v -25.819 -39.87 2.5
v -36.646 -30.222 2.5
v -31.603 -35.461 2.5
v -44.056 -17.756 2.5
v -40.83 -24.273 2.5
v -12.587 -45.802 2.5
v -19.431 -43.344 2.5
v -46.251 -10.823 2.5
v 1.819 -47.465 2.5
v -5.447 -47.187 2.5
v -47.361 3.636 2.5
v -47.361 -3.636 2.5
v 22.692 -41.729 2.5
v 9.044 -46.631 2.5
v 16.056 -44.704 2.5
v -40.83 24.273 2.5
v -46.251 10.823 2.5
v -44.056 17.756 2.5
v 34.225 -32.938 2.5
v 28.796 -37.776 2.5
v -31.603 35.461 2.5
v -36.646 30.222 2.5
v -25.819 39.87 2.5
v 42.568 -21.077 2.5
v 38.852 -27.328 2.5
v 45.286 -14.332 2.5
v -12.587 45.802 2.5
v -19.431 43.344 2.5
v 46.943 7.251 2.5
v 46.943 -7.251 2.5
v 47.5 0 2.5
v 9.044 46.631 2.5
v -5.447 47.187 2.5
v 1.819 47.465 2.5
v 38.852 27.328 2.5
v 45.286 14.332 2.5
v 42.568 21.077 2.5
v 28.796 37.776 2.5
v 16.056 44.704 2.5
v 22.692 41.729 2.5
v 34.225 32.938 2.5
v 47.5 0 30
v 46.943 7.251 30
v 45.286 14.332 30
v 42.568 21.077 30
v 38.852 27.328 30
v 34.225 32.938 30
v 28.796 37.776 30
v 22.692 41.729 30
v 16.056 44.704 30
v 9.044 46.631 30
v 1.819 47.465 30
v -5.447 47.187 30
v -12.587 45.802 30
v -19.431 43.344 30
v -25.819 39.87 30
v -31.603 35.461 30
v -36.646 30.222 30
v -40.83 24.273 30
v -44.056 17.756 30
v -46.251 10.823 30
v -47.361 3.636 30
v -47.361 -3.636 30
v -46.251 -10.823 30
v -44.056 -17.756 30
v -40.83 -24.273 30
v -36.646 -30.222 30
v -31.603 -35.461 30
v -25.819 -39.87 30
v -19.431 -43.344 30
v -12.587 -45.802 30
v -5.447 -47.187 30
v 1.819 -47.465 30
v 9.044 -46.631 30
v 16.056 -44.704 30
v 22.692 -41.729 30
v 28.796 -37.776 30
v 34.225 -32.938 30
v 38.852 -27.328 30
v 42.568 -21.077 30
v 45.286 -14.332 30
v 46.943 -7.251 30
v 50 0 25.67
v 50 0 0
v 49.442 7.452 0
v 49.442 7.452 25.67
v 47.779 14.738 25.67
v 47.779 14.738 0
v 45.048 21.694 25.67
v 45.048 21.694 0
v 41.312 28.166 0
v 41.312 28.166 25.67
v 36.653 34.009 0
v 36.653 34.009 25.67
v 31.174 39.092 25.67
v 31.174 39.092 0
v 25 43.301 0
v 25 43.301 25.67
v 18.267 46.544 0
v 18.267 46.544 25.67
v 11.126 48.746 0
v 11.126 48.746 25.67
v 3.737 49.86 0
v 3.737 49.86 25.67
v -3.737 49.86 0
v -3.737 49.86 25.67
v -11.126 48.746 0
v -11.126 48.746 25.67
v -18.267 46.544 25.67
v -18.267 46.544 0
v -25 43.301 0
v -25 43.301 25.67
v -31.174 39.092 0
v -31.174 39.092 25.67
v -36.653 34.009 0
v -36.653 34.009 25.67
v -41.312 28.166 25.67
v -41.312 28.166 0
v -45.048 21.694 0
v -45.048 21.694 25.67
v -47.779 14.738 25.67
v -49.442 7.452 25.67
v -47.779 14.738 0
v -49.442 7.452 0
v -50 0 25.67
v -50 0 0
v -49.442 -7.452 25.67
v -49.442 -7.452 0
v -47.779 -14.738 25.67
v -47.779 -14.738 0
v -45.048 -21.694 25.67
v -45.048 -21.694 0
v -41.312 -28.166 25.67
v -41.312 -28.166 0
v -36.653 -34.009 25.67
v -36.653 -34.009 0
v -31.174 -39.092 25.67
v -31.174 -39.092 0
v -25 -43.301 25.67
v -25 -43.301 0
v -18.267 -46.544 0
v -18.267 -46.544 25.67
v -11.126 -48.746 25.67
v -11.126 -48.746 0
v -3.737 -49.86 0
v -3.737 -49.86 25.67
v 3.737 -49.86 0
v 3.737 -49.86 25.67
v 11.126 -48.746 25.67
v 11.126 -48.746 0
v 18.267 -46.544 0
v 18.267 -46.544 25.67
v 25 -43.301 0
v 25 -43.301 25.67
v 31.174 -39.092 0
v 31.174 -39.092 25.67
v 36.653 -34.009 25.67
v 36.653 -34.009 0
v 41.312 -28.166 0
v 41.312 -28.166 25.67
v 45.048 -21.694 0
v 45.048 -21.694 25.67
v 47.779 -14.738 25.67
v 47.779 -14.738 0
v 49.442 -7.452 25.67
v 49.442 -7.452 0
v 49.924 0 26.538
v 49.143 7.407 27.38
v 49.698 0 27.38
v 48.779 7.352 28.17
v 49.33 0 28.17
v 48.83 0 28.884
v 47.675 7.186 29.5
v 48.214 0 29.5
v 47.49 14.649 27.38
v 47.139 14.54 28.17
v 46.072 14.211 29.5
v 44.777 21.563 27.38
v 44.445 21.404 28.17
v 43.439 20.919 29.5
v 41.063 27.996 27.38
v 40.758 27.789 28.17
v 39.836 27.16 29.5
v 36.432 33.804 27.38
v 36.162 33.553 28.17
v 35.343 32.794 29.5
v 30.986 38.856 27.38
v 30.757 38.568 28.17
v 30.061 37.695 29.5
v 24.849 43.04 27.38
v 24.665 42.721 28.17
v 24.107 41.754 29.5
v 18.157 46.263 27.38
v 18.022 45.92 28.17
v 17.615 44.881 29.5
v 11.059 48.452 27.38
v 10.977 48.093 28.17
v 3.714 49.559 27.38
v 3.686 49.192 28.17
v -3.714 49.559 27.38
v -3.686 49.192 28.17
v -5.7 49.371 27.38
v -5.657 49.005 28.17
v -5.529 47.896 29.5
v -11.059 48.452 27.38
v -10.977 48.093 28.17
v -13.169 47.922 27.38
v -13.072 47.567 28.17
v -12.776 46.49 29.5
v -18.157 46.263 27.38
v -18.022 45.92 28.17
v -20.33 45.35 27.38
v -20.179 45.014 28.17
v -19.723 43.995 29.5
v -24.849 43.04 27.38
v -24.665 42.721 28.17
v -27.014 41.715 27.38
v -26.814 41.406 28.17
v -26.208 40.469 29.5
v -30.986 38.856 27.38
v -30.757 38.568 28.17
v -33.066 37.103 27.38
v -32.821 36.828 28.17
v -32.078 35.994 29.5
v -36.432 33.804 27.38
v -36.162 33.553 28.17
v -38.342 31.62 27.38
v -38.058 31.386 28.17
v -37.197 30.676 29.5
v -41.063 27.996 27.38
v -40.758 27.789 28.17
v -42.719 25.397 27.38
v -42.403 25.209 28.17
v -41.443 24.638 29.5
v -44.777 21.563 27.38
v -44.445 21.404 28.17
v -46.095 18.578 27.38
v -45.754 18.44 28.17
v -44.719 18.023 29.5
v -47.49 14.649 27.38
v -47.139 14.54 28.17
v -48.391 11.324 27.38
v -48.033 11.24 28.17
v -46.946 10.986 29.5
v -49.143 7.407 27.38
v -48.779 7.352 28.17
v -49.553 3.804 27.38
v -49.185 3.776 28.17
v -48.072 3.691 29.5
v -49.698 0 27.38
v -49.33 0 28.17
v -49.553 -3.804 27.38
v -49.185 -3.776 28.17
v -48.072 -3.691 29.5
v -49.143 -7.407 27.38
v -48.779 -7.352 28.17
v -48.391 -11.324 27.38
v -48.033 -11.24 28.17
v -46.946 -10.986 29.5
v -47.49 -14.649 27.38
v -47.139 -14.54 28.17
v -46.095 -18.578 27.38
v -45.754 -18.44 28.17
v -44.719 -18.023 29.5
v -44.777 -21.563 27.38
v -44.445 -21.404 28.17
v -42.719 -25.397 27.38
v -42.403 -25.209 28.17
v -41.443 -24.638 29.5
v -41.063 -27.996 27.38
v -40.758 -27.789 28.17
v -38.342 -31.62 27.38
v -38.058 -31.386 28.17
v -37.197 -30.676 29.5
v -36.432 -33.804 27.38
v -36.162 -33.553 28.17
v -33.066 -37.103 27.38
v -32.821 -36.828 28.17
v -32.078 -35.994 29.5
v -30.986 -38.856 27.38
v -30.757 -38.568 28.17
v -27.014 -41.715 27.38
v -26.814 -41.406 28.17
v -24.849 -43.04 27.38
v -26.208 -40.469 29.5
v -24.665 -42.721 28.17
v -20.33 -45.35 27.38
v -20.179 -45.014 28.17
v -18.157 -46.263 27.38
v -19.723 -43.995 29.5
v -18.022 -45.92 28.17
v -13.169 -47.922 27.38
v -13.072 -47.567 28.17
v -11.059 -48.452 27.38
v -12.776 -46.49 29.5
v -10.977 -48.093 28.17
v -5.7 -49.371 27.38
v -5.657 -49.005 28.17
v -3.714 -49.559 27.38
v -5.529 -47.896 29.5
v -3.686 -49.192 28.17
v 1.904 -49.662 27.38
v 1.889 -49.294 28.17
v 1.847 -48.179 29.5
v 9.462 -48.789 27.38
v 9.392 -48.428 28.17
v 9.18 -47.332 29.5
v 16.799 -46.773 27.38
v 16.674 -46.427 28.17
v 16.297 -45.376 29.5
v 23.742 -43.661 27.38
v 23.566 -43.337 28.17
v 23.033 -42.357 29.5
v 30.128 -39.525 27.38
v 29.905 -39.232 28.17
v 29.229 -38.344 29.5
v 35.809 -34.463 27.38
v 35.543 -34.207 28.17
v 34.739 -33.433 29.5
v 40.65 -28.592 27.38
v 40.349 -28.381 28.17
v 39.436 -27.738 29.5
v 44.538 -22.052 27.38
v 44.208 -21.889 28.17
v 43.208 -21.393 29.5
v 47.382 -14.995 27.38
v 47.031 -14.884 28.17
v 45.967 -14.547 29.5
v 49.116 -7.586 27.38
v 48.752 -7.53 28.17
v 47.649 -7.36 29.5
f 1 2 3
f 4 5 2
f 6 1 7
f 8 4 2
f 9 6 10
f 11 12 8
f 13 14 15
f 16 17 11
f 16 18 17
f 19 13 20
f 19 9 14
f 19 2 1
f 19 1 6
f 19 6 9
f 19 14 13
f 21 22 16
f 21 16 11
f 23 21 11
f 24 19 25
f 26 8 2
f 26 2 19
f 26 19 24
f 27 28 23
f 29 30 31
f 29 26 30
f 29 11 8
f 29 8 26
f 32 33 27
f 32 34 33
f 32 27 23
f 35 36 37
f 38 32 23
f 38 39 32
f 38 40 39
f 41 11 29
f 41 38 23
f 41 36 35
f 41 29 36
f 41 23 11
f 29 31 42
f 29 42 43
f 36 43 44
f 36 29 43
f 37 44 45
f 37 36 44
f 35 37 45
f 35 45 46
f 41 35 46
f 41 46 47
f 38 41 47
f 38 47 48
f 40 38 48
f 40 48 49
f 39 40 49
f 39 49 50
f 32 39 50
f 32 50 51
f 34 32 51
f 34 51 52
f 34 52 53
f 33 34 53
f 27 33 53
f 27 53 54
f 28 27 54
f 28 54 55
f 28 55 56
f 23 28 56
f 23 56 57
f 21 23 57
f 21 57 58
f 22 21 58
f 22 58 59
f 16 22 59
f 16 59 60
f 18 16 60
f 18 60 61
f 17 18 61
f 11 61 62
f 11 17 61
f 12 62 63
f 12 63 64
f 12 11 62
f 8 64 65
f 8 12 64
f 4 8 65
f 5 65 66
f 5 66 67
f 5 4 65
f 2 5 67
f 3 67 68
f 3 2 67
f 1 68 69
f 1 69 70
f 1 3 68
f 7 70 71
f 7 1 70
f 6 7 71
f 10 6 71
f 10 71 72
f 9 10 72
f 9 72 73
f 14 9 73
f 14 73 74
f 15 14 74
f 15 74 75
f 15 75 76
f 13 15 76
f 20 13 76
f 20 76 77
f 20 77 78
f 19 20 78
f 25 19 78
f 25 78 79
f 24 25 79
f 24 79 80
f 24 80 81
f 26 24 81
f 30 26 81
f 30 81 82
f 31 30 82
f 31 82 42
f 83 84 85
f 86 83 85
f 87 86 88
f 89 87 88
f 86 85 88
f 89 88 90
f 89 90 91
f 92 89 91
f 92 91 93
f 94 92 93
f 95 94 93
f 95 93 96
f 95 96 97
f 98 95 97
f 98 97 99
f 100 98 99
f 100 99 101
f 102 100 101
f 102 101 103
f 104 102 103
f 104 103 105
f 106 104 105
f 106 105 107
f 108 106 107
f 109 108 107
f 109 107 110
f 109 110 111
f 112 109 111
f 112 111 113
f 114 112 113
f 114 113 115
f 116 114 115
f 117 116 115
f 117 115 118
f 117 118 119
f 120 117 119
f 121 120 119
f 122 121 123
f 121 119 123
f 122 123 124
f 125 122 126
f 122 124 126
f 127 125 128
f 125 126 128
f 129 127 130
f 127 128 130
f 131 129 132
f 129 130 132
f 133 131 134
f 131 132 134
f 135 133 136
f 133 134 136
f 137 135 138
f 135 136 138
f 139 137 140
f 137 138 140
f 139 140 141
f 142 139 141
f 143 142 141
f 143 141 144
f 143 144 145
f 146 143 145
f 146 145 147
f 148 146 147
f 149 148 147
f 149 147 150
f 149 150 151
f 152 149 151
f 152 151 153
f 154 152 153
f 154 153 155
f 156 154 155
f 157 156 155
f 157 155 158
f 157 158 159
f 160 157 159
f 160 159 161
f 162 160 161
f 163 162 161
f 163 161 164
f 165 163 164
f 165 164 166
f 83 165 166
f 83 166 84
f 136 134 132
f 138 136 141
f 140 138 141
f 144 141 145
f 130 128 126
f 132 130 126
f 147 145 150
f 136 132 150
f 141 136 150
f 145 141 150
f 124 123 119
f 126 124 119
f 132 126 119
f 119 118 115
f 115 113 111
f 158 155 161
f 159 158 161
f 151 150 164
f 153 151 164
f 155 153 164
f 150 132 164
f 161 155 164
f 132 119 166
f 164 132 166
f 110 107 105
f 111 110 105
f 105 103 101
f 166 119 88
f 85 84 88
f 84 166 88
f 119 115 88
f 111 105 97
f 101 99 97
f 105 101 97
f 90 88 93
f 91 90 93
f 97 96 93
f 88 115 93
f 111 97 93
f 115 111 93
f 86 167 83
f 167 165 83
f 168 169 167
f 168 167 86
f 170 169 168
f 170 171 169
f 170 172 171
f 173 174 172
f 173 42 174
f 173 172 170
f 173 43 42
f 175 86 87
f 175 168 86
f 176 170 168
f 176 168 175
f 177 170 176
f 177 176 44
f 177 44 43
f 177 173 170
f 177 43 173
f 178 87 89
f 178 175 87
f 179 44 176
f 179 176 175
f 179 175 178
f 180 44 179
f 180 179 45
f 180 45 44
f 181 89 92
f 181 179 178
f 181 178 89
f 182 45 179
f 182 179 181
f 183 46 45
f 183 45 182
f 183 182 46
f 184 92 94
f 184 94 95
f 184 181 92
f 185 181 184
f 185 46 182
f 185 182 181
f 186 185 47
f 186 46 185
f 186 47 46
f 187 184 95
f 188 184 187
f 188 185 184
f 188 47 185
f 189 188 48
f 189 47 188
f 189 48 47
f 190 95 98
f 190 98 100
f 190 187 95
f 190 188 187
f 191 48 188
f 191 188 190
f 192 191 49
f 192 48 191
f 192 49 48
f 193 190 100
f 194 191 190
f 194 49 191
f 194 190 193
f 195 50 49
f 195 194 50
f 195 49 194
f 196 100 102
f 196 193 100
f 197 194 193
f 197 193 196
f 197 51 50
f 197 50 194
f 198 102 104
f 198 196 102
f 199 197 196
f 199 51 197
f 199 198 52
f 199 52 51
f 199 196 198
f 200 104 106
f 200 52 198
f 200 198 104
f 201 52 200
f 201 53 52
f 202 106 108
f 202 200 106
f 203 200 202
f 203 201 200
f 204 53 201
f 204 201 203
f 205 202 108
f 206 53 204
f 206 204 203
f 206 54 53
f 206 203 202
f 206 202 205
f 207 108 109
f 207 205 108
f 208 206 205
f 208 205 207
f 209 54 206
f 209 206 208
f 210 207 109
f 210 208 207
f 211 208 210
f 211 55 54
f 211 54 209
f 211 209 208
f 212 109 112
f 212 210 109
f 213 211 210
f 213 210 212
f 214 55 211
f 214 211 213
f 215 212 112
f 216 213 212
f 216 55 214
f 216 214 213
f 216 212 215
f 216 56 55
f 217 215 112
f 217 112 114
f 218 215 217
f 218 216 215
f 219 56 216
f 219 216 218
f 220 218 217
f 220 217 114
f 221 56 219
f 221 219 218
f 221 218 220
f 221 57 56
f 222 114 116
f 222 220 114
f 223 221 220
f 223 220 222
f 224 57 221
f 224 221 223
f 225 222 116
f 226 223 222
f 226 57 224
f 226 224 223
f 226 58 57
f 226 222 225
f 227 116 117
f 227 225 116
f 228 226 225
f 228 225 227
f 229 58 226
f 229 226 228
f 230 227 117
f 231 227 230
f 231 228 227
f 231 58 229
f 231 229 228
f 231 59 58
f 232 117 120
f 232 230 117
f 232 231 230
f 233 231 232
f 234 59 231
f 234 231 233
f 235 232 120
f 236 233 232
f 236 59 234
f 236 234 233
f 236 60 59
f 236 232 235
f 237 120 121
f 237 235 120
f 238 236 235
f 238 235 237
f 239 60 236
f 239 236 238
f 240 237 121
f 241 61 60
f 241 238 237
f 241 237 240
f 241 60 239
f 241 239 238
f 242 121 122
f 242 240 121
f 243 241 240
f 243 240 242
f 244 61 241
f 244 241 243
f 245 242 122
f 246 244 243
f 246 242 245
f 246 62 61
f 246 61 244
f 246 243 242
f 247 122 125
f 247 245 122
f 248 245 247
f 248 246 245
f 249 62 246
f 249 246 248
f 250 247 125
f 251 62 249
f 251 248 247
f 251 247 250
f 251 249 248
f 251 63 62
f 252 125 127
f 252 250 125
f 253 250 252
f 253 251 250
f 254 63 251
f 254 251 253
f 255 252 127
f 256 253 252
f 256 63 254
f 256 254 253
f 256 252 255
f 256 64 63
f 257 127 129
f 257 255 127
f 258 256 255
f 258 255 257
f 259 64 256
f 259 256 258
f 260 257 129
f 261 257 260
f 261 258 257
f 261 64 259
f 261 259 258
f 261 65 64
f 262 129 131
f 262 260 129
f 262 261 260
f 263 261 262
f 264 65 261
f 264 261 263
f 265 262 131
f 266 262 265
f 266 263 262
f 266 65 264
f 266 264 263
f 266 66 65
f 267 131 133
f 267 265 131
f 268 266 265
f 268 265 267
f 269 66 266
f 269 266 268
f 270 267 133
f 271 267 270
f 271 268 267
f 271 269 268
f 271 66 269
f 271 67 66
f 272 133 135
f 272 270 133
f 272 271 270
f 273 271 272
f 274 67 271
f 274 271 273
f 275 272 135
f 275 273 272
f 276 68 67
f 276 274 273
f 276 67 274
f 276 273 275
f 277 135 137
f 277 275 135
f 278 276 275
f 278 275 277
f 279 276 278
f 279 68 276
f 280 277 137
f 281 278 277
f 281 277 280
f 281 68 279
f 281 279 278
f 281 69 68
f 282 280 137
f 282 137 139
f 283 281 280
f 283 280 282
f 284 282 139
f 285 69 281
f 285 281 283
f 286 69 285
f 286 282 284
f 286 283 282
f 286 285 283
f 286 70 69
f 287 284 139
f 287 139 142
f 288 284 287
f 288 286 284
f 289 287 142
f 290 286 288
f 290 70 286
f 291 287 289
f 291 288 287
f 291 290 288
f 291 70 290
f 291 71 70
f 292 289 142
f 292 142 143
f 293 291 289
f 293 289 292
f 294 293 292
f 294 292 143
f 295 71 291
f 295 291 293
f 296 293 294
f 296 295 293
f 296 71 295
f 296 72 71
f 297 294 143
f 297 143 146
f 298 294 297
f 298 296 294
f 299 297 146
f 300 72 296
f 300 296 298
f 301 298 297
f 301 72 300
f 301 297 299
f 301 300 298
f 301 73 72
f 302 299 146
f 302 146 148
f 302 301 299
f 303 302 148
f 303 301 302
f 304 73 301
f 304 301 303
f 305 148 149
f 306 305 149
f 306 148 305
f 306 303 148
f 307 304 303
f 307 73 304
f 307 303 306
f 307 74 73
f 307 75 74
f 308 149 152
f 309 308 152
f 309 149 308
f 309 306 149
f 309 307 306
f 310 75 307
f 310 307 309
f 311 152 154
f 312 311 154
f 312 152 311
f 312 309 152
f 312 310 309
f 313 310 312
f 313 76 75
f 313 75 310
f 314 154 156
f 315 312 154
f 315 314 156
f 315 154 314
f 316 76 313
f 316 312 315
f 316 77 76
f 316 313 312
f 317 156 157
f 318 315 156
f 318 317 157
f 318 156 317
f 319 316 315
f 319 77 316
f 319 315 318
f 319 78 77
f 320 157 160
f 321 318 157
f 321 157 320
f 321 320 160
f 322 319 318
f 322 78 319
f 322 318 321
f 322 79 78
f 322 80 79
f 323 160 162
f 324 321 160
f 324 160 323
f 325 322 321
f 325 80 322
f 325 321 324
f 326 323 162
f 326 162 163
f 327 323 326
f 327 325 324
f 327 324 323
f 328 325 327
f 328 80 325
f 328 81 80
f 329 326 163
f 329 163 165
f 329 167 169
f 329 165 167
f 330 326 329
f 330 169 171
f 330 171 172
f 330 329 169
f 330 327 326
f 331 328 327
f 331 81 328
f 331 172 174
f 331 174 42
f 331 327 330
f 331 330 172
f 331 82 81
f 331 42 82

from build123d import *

# Parameters (mm, degrees)
F0_R     = 50
F1_DEPTH = 30
F2_T     = -2.5


# Not quite as in the source:
# - a fillet or chamfer that OpenCascade refuses, or shapes differently, is made with other operations: its cross-section is extruded or revolved along the edge and cut away or added


with BuildPart() as f1:
    # F0 (on Top) → F1 (new body)
    with BuildSketch(Plane.XY):
        Circle(F0_R)
    extrude(amount=F1_DEPTH)

    # F2
    f2_openings = [f1.faces().sort_by_distance(p)[0] for p in [
        (0, 0, 30),
    ]]
    offset(amount=F2_T, openings=f2_openings)

    # F3: fillet of radius 5 on 1 edges, made by hand

    # F3_s1 → F3_t2 (revolve, cut)
    with BuildSketch(Plane.XZ):
        with BuildLine():
            ThreePointArc((50, 25.6698729811), (49.3301270189, 28.1698729811), (47.5, 30))
            Line((47.5, 30), (50, 30))
            Line((50, 30), (50, 25.6698729811))
        make_face()
    revolve(axis=Axis((0, 0, 30), (0, 0, 1)), mode=Mode.SUBTRACT)


solid = f1.part
